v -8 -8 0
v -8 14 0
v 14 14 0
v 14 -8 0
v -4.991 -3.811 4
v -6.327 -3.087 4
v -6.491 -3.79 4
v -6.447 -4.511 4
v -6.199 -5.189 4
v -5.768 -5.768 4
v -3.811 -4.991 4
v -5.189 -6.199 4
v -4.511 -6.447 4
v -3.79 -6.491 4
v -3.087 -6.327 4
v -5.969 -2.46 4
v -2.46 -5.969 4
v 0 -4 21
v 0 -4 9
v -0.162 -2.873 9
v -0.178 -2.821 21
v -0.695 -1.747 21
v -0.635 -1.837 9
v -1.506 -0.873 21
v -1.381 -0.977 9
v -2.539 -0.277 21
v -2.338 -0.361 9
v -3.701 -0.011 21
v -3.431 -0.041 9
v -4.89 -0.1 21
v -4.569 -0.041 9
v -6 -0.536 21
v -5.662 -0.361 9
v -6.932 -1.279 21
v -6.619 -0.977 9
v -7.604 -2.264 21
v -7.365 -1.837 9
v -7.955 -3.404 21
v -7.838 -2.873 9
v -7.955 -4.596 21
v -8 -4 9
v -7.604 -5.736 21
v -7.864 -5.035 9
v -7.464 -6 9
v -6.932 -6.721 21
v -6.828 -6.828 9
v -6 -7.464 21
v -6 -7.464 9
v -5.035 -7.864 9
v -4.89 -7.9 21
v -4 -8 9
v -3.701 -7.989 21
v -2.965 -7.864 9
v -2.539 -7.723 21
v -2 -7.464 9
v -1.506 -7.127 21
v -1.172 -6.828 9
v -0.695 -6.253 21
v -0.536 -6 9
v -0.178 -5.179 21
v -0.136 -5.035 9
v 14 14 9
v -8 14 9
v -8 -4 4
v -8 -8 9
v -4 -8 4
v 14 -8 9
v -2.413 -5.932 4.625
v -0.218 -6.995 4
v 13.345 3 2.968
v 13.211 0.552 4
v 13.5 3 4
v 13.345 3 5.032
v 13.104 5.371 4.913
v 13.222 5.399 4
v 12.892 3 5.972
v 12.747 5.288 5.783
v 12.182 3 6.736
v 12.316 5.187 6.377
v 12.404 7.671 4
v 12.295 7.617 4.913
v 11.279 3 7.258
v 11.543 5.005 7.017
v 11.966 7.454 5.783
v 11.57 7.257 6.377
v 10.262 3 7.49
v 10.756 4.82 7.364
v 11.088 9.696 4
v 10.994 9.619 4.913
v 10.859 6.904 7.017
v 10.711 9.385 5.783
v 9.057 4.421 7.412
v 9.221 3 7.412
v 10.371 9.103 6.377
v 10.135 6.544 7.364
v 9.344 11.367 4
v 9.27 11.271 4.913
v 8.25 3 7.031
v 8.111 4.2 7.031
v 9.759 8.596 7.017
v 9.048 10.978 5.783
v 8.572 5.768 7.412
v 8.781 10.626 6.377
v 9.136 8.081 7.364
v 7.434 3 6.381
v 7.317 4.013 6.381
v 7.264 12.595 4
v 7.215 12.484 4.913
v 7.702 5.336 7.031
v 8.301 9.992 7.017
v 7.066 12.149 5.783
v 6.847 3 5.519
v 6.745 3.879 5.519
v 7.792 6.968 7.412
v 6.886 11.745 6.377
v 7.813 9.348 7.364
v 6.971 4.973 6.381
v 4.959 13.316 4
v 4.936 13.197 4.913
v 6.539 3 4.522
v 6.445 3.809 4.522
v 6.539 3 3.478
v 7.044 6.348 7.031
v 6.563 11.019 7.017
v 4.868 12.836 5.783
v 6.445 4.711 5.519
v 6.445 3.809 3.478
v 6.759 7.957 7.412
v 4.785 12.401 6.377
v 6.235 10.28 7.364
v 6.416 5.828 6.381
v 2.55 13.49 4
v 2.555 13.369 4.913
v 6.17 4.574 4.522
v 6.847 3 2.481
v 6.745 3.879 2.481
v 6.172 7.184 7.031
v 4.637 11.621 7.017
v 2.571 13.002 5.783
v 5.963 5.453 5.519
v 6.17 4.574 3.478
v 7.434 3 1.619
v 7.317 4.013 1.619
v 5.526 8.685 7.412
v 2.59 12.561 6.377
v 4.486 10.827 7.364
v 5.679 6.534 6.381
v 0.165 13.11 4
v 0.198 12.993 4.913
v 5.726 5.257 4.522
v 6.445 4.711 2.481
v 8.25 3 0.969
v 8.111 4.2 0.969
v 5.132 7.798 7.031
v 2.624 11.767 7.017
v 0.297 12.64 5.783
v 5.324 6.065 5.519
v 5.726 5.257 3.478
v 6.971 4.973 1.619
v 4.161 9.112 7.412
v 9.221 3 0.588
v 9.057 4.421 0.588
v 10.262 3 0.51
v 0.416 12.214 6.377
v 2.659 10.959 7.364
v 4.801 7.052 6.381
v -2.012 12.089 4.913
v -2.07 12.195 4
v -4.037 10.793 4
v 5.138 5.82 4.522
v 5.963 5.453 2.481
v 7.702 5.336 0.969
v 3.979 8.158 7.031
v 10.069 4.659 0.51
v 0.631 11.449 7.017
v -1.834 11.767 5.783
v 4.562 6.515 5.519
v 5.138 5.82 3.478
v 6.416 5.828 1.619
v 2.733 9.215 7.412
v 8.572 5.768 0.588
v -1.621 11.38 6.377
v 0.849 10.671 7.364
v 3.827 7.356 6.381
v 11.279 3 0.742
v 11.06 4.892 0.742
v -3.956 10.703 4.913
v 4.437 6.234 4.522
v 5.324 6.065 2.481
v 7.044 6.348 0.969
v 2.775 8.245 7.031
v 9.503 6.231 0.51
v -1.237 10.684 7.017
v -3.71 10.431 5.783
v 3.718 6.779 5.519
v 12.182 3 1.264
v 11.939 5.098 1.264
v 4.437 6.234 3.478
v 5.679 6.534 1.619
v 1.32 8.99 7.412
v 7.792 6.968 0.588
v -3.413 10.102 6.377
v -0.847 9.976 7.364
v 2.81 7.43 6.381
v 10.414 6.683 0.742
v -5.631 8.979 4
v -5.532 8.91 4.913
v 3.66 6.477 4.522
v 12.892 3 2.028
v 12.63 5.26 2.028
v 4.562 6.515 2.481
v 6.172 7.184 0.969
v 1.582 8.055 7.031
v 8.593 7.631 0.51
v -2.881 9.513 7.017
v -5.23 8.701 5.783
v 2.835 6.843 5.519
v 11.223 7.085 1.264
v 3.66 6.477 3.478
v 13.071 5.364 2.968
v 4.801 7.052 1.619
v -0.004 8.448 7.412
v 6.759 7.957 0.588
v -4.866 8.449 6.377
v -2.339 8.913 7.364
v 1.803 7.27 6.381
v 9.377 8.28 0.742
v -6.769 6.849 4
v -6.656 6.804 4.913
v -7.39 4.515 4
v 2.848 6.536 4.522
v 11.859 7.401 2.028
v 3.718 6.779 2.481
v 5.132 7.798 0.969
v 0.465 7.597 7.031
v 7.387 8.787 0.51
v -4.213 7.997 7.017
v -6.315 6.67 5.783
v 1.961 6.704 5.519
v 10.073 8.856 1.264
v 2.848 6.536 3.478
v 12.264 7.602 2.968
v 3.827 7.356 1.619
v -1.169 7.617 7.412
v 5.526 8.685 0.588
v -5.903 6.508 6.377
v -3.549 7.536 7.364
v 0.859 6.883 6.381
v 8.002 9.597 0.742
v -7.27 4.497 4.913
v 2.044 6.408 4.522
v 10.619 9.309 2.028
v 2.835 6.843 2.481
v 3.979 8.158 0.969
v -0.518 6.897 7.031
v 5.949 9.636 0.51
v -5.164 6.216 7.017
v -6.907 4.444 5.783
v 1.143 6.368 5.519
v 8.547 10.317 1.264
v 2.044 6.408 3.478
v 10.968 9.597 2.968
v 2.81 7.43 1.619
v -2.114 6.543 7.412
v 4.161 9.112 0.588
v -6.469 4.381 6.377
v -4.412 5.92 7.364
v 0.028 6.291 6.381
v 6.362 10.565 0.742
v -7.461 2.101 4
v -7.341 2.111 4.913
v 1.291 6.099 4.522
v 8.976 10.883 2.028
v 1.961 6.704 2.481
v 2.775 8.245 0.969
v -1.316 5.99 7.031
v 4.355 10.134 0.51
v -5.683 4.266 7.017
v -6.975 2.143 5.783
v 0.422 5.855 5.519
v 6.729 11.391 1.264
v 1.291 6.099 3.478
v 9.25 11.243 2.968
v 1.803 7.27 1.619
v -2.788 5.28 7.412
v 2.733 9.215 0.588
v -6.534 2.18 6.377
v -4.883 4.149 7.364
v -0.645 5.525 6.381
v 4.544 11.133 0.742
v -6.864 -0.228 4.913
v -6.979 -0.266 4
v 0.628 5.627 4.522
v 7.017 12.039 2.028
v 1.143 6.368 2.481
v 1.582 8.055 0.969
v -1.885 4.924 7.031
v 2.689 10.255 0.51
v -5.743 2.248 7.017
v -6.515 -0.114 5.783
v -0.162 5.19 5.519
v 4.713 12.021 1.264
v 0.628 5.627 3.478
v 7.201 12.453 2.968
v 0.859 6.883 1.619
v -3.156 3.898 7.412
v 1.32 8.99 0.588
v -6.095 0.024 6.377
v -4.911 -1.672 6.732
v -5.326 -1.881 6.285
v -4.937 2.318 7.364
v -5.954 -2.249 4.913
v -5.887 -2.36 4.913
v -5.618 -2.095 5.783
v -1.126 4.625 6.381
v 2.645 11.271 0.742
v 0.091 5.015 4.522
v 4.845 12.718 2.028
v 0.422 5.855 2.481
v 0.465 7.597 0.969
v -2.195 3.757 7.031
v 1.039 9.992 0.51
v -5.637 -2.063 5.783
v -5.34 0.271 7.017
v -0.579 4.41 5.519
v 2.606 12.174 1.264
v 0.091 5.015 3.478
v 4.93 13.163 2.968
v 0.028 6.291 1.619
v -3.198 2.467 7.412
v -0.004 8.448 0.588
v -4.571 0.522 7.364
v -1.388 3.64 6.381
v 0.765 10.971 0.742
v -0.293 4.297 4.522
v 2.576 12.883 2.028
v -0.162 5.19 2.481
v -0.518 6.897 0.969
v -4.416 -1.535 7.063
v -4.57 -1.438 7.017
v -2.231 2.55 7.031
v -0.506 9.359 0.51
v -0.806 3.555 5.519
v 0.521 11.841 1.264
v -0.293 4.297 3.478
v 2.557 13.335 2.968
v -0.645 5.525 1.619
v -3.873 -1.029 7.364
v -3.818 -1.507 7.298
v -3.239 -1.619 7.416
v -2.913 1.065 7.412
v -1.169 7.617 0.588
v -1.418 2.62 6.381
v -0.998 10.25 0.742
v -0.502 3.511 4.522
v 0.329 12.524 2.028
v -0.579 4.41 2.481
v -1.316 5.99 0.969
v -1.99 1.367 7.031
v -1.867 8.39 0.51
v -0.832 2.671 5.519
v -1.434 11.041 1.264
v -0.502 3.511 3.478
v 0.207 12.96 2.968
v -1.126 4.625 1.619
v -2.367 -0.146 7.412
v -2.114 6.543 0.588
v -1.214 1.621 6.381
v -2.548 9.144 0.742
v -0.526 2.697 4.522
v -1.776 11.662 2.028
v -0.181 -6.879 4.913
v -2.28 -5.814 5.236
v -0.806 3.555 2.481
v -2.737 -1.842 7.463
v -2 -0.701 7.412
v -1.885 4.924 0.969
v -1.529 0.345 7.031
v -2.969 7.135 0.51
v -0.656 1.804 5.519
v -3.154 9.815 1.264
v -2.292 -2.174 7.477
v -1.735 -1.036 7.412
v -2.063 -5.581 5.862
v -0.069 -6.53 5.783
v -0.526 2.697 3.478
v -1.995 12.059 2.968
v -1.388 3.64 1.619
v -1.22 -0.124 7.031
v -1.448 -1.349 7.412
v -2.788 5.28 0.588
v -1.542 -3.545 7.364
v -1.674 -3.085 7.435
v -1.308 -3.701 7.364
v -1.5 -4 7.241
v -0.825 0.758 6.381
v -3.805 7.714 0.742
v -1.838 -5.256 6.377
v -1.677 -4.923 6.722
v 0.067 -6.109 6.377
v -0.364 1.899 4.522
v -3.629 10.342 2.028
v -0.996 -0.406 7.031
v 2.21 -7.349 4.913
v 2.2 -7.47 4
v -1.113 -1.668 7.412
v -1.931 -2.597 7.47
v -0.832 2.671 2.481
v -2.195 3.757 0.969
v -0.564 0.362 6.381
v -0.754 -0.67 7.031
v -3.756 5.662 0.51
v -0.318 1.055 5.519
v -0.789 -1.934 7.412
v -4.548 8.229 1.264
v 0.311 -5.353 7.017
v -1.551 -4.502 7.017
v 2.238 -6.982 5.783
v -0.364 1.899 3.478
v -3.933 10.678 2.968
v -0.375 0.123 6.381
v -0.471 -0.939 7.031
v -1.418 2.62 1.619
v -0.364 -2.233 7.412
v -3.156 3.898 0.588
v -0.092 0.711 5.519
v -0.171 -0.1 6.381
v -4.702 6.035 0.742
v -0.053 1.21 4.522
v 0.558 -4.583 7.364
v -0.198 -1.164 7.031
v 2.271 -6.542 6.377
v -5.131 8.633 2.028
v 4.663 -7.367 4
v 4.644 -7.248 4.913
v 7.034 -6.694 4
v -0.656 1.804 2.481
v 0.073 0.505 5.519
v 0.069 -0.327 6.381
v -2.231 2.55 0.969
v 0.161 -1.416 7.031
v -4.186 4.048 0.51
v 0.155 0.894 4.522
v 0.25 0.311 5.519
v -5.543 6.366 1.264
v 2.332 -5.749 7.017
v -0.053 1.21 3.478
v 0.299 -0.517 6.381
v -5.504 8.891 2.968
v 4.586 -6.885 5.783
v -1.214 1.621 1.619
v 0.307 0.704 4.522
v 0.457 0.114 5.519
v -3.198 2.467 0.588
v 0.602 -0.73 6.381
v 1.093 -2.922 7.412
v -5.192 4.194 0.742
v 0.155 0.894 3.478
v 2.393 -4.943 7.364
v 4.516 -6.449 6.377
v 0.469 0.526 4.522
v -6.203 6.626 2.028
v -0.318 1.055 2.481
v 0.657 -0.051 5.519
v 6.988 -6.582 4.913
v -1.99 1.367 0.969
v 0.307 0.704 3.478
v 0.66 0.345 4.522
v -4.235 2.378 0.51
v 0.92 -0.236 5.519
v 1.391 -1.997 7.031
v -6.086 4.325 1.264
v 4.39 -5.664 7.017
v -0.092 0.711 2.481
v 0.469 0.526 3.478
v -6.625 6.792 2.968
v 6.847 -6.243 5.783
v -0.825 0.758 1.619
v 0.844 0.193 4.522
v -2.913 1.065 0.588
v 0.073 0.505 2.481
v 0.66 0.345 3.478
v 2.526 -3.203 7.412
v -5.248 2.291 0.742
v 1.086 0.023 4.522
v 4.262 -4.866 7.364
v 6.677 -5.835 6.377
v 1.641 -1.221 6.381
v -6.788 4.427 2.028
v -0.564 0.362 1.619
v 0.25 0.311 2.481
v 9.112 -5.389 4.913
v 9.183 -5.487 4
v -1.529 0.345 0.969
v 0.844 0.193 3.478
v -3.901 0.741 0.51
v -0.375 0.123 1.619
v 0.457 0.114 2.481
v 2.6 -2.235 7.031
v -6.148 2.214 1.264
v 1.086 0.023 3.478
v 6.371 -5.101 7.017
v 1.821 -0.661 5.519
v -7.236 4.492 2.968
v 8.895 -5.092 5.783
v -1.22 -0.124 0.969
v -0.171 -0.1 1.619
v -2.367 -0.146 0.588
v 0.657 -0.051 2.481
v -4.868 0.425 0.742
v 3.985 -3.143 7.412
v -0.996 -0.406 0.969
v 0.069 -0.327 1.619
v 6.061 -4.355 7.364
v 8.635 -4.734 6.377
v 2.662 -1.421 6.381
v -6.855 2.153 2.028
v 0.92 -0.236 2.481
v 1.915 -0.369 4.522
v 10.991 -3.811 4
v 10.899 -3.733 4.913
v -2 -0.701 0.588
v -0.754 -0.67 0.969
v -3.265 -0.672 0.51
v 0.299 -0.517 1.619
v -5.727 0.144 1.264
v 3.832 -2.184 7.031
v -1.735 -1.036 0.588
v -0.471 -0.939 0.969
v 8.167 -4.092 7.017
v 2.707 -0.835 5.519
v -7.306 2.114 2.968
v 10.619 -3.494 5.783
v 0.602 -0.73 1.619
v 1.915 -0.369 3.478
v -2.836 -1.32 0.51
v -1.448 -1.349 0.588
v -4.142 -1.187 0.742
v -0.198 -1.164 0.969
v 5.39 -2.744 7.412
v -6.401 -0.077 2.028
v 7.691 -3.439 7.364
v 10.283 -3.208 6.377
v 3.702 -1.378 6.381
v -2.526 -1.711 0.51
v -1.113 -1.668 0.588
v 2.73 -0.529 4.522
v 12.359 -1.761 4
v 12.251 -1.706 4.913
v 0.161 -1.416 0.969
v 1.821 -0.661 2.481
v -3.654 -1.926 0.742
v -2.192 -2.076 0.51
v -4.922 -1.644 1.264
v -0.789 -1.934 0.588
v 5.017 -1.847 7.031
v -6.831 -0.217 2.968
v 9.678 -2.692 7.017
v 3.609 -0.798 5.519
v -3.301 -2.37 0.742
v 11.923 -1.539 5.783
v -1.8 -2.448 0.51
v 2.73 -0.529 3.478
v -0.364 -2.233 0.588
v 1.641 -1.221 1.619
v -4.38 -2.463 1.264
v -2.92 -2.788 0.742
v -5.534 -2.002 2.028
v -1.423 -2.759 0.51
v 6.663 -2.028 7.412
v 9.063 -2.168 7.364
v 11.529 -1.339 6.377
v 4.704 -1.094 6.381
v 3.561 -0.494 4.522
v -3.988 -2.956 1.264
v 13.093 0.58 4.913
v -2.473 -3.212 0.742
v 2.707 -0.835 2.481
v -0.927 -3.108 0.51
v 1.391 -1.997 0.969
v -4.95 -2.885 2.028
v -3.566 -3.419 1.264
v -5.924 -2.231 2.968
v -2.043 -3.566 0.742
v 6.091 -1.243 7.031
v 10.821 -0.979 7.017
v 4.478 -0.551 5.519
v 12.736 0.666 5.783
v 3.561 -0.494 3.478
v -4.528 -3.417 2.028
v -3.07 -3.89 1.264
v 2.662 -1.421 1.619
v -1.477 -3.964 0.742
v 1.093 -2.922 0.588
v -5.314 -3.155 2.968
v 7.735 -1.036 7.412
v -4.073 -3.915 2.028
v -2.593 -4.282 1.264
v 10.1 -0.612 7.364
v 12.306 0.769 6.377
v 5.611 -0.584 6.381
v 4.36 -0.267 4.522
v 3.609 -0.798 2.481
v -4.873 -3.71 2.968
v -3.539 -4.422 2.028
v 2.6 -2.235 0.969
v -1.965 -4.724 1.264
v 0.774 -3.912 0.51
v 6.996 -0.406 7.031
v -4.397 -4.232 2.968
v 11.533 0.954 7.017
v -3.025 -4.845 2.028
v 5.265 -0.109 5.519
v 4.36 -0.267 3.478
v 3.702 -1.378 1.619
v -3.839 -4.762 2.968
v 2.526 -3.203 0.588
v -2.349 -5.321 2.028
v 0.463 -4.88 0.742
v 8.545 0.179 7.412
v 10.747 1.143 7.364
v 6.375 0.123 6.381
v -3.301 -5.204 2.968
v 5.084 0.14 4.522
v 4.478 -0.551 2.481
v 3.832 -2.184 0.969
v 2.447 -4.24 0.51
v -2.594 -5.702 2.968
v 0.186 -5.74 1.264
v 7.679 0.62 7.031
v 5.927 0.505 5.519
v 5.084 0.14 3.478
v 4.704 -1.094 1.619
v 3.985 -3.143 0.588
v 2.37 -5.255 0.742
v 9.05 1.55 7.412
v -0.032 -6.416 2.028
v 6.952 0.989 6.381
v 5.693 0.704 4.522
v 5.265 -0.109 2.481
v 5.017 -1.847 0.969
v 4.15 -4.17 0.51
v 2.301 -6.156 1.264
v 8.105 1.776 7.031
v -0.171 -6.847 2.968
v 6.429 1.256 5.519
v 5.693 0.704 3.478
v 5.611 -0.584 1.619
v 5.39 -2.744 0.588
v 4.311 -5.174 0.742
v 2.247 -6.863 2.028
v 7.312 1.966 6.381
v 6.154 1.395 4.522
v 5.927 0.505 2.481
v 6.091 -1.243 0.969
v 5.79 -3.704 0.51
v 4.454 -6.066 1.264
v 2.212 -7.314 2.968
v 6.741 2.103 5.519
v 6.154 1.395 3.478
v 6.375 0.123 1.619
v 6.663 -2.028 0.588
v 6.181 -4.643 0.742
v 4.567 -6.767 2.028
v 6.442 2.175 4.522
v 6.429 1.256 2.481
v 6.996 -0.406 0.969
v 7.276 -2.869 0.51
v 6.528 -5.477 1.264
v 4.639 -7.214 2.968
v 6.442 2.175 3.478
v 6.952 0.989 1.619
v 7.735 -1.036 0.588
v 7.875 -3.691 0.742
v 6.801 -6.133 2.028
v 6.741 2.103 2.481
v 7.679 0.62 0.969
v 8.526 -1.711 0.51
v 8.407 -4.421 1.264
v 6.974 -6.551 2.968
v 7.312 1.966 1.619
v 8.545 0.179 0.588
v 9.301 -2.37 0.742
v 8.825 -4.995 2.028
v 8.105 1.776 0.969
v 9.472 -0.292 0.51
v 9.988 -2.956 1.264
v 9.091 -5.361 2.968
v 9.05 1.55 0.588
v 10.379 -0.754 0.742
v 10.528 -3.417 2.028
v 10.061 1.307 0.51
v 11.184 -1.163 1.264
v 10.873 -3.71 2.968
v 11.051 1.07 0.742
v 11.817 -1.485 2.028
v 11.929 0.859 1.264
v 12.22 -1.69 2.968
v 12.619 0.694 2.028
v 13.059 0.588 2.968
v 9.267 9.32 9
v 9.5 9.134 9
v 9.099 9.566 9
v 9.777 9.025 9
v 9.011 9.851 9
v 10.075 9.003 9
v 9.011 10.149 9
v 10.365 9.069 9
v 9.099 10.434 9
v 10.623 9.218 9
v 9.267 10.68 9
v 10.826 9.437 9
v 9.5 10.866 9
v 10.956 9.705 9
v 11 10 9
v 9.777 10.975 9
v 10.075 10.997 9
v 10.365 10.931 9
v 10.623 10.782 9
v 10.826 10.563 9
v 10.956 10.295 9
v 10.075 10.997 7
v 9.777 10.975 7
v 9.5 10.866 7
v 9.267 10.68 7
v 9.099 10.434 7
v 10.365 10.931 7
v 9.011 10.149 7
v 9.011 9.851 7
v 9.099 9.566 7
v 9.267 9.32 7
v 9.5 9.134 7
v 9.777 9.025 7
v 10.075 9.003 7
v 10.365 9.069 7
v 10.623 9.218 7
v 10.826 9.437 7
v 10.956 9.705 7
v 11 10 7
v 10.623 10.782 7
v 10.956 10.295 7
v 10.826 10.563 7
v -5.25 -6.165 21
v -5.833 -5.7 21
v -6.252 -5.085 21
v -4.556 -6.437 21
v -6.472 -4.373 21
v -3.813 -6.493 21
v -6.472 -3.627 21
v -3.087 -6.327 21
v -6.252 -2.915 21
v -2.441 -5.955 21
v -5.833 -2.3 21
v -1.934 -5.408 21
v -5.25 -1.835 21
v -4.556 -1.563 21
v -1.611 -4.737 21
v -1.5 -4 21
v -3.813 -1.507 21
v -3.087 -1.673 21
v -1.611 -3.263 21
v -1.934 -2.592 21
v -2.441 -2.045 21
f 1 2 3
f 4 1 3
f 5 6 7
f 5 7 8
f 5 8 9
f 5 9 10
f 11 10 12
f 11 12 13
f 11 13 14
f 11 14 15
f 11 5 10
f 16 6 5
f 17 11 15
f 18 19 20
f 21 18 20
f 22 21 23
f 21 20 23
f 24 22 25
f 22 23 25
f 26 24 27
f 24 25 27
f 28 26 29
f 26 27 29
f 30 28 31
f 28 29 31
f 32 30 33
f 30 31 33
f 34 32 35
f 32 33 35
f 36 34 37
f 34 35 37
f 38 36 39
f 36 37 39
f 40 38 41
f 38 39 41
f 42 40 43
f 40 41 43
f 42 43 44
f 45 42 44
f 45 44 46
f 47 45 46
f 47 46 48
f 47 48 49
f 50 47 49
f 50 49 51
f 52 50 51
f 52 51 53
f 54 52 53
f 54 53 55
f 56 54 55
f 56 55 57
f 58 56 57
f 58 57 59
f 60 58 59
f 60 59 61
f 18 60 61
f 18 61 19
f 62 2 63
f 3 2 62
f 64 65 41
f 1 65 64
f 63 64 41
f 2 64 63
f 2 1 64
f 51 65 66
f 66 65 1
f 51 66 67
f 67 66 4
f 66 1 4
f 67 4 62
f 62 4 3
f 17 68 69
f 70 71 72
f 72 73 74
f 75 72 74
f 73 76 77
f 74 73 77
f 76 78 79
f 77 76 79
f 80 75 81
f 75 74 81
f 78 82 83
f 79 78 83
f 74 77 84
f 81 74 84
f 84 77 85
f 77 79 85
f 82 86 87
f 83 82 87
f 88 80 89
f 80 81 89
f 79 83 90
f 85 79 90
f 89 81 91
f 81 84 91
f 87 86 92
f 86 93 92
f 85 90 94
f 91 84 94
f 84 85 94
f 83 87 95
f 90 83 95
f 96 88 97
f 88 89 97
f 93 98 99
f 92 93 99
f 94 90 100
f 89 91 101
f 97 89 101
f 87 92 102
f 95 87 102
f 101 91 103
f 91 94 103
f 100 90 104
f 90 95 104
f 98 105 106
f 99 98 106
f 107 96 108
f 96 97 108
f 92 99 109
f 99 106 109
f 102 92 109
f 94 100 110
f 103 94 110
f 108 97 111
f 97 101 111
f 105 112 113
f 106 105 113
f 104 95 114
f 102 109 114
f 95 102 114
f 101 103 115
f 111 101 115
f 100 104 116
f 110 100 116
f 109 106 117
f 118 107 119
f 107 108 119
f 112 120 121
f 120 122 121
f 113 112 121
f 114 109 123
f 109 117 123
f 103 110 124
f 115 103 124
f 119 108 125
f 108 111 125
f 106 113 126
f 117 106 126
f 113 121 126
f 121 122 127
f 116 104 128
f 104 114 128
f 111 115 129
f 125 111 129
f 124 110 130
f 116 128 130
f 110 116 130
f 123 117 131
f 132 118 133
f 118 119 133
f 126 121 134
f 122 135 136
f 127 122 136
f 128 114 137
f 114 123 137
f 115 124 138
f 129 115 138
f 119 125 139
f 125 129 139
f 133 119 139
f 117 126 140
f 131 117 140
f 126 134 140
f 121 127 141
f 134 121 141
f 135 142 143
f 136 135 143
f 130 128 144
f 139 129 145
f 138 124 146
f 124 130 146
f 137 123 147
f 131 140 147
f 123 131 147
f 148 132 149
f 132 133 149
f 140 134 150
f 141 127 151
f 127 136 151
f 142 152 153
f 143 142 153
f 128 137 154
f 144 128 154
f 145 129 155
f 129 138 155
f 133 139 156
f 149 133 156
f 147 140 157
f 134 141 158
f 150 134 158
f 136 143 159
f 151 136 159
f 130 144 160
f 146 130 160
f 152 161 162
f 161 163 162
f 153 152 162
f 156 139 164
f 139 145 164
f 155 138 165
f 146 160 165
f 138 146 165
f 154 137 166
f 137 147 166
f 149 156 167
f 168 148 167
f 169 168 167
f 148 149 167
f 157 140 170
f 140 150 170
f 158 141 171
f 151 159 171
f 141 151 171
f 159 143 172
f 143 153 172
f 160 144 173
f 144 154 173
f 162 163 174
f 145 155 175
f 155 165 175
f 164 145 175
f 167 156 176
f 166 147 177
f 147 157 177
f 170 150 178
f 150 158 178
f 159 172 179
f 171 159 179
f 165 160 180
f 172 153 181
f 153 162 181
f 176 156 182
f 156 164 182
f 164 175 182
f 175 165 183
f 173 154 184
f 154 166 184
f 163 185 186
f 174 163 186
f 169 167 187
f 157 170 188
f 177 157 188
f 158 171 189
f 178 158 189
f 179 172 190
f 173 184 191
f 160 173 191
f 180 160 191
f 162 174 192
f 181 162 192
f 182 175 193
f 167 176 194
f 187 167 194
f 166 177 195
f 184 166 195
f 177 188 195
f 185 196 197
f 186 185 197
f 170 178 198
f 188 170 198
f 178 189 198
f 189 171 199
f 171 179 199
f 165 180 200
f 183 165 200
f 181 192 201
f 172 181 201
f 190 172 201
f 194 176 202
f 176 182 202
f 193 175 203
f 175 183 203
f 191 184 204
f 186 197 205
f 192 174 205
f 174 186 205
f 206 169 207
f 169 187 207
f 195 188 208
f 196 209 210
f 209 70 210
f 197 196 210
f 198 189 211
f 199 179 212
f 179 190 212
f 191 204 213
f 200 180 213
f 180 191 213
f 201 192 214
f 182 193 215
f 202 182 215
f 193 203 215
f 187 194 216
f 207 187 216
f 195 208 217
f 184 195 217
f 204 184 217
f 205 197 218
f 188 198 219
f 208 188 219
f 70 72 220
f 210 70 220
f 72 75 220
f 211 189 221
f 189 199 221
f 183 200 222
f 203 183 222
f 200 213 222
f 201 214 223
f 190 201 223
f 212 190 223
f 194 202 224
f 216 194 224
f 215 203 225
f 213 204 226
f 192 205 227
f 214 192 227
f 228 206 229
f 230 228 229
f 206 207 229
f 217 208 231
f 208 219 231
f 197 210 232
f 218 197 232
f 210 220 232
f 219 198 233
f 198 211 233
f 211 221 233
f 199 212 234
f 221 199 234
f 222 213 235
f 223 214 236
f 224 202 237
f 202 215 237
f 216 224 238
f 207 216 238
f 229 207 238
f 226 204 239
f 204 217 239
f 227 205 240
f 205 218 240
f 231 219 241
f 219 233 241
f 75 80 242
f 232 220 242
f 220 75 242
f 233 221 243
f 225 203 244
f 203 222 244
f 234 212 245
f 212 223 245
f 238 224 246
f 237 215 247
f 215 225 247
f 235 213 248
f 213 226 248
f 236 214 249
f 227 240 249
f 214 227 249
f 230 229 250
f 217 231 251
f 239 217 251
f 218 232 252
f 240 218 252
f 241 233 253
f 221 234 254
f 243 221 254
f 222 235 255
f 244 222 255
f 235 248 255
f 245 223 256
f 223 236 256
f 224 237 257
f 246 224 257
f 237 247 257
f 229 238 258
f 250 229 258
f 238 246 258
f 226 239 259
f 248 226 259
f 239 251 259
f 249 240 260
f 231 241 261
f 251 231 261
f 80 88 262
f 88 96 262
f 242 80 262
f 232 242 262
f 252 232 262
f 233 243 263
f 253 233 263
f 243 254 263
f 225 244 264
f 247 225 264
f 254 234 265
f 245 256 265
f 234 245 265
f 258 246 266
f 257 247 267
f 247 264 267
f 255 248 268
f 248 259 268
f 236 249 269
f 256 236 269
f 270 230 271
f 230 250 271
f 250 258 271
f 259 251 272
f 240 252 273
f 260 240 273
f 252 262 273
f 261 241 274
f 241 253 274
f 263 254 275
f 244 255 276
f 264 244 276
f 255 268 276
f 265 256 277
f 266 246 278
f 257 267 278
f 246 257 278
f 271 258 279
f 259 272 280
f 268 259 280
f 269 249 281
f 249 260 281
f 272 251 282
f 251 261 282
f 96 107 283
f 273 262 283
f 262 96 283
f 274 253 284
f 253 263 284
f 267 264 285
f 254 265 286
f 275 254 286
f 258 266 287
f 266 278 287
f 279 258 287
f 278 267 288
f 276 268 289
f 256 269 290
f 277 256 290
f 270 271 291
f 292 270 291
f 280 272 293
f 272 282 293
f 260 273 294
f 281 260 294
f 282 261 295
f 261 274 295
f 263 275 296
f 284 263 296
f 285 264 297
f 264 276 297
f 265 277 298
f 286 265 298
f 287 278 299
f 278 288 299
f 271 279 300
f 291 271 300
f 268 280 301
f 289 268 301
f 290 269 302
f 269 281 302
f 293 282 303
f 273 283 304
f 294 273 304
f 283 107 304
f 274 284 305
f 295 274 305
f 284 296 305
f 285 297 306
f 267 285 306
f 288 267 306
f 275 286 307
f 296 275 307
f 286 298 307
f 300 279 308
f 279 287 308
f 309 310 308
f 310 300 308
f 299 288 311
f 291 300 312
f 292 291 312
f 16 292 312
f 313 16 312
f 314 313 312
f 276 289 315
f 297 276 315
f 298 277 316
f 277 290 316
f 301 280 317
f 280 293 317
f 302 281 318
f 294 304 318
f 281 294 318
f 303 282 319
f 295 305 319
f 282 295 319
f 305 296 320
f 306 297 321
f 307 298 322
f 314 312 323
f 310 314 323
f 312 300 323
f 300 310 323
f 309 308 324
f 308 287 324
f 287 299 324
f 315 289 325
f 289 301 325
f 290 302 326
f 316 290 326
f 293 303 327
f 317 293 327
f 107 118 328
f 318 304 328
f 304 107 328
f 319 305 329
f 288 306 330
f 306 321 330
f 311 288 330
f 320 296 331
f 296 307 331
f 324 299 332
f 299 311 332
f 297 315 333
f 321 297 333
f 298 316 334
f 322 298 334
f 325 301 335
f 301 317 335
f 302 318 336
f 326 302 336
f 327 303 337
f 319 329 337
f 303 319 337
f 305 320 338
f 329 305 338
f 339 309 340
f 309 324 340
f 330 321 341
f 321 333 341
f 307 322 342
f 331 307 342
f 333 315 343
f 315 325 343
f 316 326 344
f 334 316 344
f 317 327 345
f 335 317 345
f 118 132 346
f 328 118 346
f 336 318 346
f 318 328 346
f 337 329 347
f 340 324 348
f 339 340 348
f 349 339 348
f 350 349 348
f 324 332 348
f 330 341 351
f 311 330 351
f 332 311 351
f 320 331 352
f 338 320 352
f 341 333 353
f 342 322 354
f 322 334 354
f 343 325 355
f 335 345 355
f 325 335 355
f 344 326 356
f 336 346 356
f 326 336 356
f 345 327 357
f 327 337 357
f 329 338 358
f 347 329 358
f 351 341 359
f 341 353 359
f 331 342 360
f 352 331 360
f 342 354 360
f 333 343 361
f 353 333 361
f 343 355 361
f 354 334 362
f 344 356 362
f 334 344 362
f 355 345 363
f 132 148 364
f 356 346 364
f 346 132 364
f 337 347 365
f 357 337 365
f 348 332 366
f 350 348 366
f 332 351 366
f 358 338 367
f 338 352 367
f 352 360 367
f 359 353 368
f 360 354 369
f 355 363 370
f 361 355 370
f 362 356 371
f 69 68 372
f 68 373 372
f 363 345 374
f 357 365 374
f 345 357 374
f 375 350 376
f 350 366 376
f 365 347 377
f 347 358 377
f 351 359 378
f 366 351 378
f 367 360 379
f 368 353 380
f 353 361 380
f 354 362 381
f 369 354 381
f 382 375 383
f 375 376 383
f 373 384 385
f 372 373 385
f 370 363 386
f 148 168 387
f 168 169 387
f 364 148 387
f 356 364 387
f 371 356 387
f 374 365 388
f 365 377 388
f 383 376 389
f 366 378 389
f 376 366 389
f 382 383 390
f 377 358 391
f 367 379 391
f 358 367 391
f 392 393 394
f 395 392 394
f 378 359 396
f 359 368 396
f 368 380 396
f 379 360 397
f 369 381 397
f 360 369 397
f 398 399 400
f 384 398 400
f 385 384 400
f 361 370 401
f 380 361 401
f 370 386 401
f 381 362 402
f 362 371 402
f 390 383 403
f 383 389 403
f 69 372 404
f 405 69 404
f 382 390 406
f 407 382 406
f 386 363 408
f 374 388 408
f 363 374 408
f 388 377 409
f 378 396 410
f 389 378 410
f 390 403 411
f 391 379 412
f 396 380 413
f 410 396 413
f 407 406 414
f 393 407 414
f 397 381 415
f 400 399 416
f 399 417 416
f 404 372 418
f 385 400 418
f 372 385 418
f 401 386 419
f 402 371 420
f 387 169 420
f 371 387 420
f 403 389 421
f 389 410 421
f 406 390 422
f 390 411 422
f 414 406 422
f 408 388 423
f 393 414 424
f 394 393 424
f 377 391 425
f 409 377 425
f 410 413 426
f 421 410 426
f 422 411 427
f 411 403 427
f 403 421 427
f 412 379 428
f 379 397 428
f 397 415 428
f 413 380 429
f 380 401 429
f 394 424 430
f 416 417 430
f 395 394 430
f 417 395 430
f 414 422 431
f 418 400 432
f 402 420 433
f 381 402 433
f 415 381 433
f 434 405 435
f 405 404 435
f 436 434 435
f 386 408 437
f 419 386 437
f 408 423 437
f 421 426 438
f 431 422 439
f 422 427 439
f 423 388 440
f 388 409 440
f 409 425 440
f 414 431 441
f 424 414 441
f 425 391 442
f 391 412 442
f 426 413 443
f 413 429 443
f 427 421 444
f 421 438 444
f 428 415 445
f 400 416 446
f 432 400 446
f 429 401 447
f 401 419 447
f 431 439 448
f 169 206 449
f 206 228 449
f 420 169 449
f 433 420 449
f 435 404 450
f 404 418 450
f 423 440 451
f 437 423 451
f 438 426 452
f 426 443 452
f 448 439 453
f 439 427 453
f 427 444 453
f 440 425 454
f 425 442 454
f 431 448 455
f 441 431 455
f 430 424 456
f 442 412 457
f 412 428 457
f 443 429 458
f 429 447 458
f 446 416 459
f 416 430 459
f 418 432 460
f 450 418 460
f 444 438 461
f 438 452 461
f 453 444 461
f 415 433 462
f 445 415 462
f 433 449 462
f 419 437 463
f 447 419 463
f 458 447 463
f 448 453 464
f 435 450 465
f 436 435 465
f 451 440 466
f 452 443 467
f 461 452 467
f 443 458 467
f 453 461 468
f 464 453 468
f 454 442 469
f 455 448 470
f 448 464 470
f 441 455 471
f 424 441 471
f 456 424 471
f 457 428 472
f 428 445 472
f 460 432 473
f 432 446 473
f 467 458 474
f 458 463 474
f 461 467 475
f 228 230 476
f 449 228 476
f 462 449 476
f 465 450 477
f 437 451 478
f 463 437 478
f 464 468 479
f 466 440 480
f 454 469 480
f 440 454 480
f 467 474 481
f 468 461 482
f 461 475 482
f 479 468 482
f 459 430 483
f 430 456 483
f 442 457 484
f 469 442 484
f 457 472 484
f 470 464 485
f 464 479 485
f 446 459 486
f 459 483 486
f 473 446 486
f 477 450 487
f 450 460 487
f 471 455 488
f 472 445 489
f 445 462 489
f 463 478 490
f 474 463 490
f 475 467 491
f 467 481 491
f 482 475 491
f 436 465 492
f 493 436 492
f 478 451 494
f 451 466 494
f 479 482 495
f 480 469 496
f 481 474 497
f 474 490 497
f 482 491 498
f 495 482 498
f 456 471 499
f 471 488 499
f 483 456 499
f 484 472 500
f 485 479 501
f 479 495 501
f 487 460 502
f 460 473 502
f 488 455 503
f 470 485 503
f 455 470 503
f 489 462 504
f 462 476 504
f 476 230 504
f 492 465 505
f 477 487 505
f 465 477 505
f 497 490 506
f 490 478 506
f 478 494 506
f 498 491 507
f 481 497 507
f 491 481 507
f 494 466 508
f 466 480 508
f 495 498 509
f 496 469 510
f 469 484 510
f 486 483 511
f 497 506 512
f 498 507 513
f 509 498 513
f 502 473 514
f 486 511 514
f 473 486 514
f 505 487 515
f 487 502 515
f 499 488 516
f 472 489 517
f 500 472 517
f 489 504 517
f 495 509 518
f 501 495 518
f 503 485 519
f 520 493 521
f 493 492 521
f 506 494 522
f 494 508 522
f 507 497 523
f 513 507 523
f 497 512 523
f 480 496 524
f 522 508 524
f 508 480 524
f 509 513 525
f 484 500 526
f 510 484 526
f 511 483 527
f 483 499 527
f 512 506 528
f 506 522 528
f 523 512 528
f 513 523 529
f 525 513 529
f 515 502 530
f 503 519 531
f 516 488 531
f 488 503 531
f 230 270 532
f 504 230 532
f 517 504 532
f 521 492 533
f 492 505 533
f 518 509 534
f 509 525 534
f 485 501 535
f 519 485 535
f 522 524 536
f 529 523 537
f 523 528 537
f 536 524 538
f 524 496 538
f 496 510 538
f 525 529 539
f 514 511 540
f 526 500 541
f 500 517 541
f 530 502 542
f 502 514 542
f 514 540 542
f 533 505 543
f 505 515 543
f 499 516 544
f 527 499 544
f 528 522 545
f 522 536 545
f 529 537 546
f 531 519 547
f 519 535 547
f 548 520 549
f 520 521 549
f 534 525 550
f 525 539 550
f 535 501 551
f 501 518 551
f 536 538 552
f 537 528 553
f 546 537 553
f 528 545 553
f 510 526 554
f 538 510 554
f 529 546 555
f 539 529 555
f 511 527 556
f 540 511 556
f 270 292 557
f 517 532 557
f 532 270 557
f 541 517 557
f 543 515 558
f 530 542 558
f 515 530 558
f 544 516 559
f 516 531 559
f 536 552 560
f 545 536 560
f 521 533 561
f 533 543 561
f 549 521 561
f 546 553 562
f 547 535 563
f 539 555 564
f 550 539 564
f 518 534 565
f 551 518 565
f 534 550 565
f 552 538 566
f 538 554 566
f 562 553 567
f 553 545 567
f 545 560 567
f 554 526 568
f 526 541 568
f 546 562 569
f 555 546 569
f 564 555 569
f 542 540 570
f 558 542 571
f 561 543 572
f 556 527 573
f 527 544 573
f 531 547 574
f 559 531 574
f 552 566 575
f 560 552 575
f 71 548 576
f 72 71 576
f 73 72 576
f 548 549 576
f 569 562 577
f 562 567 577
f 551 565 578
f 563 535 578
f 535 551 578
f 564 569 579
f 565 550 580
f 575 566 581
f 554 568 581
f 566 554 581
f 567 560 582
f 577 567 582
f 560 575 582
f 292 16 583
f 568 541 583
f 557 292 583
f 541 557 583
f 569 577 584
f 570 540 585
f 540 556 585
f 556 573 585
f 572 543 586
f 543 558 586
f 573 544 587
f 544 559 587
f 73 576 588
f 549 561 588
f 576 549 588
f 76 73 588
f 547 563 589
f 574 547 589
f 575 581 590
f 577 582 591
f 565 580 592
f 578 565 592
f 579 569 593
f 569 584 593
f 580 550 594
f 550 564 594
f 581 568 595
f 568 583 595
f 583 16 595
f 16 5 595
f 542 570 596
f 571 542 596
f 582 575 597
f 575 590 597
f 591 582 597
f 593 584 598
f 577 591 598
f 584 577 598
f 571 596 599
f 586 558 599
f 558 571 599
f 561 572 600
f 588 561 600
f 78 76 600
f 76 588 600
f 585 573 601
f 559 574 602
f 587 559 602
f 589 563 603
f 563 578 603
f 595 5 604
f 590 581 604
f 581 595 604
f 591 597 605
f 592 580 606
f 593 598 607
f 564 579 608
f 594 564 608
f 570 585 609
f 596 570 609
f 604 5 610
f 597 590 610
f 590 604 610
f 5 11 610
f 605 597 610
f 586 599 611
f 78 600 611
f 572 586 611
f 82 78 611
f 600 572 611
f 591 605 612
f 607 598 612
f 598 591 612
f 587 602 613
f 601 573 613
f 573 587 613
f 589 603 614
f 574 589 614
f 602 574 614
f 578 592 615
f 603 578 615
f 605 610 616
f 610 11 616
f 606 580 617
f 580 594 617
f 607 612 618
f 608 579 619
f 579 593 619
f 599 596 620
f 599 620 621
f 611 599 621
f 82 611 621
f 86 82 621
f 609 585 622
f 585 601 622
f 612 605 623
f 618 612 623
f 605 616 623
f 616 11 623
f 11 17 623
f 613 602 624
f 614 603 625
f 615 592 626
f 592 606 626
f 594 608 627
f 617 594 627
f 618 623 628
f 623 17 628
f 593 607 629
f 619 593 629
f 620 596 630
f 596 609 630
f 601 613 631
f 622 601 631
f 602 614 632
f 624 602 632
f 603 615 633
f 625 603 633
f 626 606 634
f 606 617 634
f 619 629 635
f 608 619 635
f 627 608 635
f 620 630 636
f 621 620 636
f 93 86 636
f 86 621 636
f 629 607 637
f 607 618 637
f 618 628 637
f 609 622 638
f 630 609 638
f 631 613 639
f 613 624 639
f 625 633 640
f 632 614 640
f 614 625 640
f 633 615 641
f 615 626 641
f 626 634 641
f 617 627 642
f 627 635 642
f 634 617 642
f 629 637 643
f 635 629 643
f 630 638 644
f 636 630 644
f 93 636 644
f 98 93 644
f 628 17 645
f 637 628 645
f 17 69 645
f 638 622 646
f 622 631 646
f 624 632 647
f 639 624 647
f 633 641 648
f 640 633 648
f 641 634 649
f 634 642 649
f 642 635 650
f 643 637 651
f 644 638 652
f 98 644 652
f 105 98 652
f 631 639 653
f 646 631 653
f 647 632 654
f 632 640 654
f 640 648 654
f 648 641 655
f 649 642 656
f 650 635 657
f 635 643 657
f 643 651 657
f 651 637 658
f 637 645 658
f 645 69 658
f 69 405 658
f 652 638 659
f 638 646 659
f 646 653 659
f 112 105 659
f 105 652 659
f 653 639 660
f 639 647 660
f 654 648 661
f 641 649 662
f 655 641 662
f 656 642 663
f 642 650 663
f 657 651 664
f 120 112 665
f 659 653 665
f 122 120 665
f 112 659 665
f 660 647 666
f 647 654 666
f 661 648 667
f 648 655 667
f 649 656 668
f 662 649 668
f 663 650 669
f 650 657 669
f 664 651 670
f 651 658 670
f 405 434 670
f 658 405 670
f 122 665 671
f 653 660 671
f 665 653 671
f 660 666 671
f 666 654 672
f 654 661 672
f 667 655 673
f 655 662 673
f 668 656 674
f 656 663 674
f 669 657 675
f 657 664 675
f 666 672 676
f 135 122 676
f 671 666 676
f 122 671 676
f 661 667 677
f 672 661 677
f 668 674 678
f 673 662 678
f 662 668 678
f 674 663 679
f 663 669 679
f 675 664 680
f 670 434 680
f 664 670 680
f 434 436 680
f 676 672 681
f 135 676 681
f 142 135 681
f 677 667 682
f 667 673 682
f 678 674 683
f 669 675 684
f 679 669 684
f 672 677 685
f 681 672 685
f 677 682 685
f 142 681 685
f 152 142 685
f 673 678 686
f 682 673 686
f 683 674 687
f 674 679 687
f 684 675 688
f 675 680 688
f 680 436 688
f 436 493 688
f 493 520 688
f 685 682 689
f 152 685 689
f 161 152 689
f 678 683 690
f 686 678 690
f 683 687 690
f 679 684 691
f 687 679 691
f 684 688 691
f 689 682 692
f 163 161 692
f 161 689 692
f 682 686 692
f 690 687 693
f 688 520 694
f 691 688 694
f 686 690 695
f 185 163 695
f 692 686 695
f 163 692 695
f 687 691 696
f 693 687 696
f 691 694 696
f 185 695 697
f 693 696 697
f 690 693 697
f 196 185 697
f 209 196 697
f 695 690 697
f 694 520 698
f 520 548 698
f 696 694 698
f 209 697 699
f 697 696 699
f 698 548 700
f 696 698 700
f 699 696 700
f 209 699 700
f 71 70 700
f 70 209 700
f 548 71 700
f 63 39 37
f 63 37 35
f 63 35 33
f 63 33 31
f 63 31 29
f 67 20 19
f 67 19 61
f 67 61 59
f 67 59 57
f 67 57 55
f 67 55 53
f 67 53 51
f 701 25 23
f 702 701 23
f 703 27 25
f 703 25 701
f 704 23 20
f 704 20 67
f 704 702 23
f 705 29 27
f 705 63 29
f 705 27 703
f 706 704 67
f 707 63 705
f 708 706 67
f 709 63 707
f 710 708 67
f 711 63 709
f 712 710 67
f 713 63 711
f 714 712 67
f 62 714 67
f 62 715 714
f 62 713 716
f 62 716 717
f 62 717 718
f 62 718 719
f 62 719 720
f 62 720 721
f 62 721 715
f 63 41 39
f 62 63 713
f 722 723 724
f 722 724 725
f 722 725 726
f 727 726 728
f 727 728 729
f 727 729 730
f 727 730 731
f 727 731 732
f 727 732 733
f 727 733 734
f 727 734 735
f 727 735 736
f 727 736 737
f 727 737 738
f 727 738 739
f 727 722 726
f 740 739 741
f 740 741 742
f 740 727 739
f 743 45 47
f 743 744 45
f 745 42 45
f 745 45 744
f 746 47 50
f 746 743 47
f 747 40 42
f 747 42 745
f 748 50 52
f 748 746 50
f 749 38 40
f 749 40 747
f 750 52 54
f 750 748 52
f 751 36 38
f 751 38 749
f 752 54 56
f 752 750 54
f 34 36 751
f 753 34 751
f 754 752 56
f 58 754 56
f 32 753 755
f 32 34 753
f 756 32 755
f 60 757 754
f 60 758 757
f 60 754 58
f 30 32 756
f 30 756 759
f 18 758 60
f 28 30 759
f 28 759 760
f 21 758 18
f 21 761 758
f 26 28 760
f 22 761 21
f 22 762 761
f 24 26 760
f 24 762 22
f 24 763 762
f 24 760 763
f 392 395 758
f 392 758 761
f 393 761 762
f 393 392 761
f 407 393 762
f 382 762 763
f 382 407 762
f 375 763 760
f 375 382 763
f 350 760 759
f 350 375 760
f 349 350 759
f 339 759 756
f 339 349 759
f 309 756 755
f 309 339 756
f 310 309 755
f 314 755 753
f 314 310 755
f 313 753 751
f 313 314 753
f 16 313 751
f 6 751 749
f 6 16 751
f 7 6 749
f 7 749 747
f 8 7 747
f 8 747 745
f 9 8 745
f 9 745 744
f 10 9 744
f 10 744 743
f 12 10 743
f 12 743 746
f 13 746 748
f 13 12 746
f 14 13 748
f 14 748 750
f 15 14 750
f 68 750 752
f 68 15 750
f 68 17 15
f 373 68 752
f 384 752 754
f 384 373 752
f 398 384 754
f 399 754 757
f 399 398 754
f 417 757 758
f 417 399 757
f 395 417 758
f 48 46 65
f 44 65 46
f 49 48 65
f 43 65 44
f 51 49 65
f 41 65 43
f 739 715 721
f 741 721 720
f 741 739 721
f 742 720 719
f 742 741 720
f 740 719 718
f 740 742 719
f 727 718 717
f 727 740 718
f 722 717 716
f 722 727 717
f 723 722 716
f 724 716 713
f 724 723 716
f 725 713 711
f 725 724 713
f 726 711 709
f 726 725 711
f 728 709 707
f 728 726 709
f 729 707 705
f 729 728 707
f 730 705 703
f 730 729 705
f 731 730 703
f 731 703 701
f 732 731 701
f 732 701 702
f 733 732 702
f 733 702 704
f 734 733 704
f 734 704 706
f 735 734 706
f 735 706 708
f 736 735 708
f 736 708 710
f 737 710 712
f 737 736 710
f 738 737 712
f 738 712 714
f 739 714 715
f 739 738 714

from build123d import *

# Parameters (mm, degrees)
TORUS_R           = 3.5
CYLINDER002_R     = 1
CYLINDER002_DEPTH = 10
CYLINDER_R        = 2.5
CYLINDER_DEPTH    = 17
CYLINDER001_R     = 4
CYLINDER001_DEPTH = 17
BOX_W             = 22
BOX_H             = 22
BOX_DEPTH         = 9


with BuildPart() as torus:
    # Torus → Torus (revolve)
    with BuildSketch(Plane(origin=(3, 3, 4), x_dir=(1, 0, 0), z_dir=(0, -1, 0))):
        with Locations((7, 0)):
            Circle(TORUS_R)
    revolve(axis=Axis((3, 3, 4), (0, 0, 1)))


with BuildPart() as cylinder002:
    # Cylinder002 → Cylinder002 (new body)
    with BuildSketch(Plane(origin=(10, 10, 7), x_dir=(1, 0, 0), z_dir=(0, 0, 1))):
        Circle(CYLINDER002_R)
    extrude(amount=CYLINDER002_DEPTH)


with BuildPart() as fusion:
    # Cylinder → Cylinder (new body)
    with BuildSketch(Plane(origin=(-4, -4, 4), x_dir=(1, 0, 0), z_dir=(0, 0, 1))):
        Circle(CYLINDER_R)
    extrude(amount=CYLINDER_DEPTH)

    # Fusion: union Torus, Cylinder002
    add(torus.part)
    add(cylinder002.part)


with BuildPart() as cylinder001:
    # Cylinder001 → Cylinder001 (new body)
    with BuildSketch(Plane(origin=(-4, -4, 4), x_dir=(1, 0, 0), z_dir=(0, 0, 1))):
        Circle(CYLINDER001_R)
    extrude(amount=CYLINDER001_DEPTH)


with BuildPart() as cut:
    # Box → Box (new body)
    with BuildSketch(Plane(origin=(-8, -8, 0), x_dir=(1, 0, 0), z_dir=(0, 0, 1))):
        with Locations((11, 11)):
            Rectangle(BOX_W, BOX_H)
    extrude(amount=BOX_DEPTH)

    # Fusion001: union Cylinder001
    add(cylinder001.part)

    # Cut: cut Fusion
    add(fusion.part, mode=Mode.SUBTRACT)


solid = cut.part
